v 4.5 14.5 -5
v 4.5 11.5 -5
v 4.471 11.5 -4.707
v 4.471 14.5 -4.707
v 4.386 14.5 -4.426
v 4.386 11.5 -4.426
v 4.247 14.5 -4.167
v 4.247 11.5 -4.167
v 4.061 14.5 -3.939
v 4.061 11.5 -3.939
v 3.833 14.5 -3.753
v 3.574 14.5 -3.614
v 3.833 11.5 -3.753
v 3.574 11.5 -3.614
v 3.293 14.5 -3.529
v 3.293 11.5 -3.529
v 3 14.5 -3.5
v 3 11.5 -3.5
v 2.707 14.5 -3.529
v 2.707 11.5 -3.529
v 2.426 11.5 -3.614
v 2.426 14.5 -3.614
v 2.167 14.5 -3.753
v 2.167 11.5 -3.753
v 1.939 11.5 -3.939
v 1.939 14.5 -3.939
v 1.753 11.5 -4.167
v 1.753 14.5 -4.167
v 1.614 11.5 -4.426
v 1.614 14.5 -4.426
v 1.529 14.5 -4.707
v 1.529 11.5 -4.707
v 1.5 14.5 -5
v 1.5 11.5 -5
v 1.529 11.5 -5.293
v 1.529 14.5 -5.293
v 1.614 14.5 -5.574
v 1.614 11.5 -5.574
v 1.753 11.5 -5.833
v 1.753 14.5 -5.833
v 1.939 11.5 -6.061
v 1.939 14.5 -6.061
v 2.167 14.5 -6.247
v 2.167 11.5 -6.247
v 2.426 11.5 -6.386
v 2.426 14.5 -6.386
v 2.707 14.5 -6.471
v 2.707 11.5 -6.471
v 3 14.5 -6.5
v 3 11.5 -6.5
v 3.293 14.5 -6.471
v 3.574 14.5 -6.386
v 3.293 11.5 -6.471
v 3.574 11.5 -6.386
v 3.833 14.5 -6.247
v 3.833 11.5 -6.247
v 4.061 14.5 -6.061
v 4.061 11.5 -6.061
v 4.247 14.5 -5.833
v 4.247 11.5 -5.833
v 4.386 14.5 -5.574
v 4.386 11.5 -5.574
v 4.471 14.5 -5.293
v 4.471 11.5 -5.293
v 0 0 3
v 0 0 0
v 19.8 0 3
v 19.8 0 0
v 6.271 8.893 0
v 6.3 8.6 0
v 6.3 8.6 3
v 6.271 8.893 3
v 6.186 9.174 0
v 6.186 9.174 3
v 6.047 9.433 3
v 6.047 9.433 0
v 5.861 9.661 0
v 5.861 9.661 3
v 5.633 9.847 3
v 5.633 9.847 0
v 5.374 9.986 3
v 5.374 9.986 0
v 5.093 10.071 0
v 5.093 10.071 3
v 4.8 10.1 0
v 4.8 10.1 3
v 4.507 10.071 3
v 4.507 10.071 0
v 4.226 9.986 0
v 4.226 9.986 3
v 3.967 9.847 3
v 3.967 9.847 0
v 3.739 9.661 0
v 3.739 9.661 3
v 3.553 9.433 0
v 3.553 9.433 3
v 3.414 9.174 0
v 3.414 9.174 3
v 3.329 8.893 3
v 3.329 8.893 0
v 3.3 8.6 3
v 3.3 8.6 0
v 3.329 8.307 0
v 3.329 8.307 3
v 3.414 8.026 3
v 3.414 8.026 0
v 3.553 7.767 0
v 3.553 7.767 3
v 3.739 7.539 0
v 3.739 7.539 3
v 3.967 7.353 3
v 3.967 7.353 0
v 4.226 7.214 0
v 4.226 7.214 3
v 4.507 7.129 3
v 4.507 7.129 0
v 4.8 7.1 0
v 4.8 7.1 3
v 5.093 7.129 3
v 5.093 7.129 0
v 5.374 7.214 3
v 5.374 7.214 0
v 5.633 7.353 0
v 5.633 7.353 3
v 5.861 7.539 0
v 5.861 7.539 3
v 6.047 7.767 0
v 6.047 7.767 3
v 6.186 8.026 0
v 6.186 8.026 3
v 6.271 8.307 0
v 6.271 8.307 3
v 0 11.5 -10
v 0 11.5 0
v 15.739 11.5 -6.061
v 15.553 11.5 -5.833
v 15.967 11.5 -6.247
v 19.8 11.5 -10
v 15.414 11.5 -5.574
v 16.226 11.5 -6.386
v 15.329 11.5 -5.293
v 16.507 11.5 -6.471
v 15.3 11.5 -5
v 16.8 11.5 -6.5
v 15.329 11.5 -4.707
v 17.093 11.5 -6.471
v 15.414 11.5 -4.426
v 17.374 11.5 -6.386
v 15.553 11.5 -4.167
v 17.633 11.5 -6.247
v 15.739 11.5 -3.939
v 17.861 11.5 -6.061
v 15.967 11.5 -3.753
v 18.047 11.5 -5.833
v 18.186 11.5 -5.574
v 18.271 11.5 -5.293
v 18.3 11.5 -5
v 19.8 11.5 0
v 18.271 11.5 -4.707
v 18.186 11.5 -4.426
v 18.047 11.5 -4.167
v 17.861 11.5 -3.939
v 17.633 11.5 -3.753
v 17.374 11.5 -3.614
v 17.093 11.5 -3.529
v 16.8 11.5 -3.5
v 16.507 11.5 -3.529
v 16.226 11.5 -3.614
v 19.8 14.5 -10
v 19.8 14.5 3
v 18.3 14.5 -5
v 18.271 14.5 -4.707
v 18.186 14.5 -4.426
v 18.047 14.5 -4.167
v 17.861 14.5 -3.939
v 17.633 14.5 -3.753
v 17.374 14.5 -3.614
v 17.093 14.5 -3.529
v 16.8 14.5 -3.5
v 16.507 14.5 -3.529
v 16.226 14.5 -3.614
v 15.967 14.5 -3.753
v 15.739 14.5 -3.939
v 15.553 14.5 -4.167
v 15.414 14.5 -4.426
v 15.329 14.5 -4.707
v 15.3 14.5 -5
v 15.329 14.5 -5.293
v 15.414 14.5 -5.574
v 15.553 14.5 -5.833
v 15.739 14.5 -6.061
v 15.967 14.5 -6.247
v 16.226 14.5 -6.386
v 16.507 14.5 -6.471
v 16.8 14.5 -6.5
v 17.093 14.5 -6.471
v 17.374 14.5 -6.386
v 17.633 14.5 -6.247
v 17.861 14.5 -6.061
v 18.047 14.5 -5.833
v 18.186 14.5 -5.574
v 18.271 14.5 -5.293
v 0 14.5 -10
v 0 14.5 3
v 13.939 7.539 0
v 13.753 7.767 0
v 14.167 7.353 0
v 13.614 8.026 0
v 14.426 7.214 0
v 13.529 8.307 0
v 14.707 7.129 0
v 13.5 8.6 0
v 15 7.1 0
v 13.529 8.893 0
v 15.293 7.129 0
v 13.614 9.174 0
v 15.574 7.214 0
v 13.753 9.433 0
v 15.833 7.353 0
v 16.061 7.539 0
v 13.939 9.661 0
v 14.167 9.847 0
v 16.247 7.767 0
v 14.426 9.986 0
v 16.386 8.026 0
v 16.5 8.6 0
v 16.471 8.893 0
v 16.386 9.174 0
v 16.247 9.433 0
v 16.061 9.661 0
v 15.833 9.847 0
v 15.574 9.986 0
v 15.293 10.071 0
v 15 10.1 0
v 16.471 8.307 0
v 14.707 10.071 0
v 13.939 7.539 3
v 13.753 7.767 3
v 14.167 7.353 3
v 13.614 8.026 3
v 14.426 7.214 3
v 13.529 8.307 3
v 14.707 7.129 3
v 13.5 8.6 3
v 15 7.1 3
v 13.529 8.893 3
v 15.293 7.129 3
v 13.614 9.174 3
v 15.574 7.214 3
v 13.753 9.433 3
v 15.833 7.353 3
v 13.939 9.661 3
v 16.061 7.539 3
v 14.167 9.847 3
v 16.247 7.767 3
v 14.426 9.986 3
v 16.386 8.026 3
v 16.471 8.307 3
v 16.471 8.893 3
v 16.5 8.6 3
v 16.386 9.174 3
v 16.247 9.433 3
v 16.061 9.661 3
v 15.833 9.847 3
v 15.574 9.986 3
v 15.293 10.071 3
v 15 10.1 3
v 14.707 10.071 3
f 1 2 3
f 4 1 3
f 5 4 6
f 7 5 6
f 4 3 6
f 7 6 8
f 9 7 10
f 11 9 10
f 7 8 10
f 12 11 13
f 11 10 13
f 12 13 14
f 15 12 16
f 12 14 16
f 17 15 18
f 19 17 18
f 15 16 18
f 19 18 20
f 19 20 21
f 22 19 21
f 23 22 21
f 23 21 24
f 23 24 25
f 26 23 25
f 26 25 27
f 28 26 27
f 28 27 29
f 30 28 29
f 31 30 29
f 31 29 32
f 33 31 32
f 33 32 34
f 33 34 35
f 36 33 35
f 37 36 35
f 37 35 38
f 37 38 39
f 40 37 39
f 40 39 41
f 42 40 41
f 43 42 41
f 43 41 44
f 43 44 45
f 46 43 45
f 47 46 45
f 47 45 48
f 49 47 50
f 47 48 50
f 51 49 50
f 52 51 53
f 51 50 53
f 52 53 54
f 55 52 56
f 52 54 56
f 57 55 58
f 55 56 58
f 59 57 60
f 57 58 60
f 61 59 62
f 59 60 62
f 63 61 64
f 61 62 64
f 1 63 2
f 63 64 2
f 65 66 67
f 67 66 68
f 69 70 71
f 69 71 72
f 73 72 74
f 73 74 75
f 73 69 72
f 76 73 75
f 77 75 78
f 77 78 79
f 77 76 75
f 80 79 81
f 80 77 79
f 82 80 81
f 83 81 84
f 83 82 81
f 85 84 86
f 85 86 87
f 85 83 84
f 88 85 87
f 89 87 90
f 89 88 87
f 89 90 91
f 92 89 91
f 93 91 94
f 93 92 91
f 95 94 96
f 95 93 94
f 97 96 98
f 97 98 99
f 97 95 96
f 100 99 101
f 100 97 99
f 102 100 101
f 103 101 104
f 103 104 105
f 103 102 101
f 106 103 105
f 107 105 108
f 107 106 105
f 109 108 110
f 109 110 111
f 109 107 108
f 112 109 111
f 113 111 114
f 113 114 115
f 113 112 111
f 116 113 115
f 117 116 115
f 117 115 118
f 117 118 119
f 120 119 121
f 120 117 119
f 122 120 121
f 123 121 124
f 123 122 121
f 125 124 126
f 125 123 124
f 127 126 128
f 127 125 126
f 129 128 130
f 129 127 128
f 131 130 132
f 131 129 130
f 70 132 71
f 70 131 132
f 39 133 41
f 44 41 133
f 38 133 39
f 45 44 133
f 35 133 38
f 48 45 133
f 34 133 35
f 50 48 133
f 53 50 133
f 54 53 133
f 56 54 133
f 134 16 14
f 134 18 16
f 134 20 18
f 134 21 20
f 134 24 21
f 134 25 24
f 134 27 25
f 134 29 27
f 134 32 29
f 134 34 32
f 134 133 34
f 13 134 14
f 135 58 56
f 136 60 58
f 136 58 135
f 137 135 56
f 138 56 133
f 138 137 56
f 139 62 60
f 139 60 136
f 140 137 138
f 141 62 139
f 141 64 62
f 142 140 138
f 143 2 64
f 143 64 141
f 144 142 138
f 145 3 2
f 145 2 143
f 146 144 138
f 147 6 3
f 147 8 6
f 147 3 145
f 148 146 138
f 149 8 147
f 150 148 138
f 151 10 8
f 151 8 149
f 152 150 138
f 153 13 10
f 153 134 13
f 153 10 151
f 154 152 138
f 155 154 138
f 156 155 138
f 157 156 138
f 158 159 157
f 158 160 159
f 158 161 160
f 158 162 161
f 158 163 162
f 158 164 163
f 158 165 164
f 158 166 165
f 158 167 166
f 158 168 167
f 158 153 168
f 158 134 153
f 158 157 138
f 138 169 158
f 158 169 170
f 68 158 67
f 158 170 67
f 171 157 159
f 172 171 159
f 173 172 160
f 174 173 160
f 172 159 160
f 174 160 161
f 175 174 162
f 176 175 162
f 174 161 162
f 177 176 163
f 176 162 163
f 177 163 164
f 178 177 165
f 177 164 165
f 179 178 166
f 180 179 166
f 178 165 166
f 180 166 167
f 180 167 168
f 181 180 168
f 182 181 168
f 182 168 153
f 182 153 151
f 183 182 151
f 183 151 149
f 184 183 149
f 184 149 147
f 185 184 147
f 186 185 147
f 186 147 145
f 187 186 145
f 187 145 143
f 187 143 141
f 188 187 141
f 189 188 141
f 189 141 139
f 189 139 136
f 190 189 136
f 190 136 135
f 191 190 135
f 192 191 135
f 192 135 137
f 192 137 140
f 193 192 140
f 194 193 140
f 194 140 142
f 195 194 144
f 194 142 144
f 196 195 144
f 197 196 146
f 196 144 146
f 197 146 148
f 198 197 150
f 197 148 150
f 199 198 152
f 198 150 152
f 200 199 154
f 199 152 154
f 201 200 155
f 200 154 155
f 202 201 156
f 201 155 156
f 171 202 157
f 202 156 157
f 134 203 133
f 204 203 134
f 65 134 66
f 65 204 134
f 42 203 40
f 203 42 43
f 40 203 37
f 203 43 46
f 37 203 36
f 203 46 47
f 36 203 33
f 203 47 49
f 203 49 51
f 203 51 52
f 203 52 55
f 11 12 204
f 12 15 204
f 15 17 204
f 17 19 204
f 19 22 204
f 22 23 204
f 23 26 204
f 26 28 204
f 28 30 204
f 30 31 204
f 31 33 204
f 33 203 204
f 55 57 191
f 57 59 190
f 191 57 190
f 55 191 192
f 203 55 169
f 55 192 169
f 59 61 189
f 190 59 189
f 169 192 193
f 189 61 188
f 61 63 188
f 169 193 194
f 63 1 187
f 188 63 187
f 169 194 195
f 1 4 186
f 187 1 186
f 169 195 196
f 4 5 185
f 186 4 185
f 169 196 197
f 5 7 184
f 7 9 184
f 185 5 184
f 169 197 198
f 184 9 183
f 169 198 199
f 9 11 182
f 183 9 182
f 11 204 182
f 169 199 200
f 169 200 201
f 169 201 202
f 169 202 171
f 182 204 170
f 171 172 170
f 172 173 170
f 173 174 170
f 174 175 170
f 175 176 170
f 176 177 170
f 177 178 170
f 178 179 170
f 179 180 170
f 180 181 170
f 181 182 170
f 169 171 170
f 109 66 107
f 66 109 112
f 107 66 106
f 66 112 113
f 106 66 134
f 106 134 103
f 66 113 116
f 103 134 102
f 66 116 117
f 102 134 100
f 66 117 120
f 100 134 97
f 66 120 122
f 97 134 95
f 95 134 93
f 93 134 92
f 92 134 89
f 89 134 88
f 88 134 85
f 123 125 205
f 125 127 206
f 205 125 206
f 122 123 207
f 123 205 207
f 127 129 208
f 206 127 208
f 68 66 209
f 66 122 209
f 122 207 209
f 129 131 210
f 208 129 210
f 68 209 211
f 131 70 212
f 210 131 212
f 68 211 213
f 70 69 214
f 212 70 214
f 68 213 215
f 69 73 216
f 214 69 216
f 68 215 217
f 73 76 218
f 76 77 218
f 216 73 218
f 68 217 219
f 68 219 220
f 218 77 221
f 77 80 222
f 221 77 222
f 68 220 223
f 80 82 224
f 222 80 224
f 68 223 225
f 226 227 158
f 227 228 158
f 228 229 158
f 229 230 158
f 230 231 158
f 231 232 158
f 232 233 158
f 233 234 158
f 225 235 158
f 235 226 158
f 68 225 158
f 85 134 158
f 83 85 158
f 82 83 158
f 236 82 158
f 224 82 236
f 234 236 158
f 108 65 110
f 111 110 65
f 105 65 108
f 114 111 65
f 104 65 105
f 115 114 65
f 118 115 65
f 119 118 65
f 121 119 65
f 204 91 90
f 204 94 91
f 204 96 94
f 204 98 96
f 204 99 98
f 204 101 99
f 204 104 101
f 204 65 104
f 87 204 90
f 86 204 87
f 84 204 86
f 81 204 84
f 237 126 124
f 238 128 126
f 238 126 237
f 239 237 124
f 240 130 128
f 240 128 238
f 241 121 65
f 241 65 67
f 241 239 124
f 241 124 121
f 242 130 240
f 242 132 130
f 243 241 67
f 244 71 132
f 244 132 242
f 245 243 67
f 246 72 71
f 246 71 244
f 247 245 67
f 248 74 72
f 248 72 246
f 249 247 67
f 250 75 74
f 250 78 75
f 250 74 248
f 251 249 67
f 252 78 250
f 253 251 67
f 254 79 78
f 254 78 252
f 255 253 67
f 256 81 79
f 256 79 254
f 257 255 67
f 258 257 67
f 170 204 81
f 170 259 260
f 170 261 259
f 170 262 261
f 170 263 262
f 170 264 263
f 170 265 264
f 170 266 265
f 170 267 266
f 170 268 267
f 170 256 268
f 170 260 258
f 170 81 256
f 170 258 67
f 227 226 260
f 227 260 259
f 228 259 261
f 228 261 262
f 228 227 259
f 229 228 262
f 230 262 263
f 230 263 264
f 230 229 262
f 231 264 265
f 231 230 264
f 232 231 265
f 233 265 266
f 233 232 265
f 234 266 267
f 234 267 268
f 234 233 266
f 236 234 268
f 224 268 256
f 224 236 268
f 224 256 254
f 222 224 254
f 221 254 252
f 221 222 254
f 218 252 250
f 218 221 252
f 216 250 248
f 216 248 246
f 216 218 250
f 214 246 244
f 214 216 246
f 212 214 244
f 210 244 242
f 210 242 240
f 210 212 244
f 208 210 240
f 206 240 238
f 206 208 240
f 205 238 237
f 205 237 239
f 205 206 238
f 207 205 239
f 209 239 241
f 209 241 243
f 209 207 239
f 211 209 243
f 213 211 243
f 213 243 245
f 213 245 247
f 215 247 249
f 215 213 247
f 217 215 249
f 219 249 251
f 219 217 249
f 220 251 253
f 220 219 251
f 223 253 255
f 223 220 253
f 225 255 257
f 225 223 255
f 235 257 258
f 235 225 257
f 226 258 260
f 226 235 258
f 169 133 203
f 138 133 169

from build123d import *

# Parameters (mm, degrees)
SKETCH_W     = 19.8
SKETCH_H     = 14.5
SKETCH_R     = 1.5
PAD_DEPTH    = 3
SKETCH001_W  = 19.8
SKETCH001_H  = 3
PAD001_DEPTH = 10
SKETCH002_R  = 1.5
POCKET_DEPTH = 3.001


with BuildPart() as part:
    # Sketch → Pad (new body)
    with BuildSketch(Plane.XY):
        with Locations((9.9, 7.25)):
            Rectangle(SKETCH_W, SKETCH_H)
        with Locations((4.8, 8.6)):
            Circle(SKETCH_R, mode=Mode.SUBTRACT)
        with Locations((15, 8.6)):
            Circle(SKETCH_R, mode=Mode.SUBTRACT)
    extrude(amount=PAD_DEPTH)

    # Sketch001 → Pad001 (new body)
    with BuildSketch(Plane(origin=(0, 0, 0), x_dir=(1, 0, 0), z_dir=(0, 0, -1))):
        with Locations((9.9, -13)):
            Rectangle(SKETCH001_W, SKETCH001_H)
    extrude(amount=PAD001_DEPTH)

    # Sketch002 → Pocket (cut, through all)
    with BuildSketch(Plane.XZ.offset(-11.5)):
        with Locations((3, -5)):
            Circle(SKETCH002_R)
        with Locations((16.8, -5)):
            Circle(SKETCH002_R)
    extrude(amount=-POCKET_DEPTH, mode=Mode.SUBTRACT)


solid = part.part
